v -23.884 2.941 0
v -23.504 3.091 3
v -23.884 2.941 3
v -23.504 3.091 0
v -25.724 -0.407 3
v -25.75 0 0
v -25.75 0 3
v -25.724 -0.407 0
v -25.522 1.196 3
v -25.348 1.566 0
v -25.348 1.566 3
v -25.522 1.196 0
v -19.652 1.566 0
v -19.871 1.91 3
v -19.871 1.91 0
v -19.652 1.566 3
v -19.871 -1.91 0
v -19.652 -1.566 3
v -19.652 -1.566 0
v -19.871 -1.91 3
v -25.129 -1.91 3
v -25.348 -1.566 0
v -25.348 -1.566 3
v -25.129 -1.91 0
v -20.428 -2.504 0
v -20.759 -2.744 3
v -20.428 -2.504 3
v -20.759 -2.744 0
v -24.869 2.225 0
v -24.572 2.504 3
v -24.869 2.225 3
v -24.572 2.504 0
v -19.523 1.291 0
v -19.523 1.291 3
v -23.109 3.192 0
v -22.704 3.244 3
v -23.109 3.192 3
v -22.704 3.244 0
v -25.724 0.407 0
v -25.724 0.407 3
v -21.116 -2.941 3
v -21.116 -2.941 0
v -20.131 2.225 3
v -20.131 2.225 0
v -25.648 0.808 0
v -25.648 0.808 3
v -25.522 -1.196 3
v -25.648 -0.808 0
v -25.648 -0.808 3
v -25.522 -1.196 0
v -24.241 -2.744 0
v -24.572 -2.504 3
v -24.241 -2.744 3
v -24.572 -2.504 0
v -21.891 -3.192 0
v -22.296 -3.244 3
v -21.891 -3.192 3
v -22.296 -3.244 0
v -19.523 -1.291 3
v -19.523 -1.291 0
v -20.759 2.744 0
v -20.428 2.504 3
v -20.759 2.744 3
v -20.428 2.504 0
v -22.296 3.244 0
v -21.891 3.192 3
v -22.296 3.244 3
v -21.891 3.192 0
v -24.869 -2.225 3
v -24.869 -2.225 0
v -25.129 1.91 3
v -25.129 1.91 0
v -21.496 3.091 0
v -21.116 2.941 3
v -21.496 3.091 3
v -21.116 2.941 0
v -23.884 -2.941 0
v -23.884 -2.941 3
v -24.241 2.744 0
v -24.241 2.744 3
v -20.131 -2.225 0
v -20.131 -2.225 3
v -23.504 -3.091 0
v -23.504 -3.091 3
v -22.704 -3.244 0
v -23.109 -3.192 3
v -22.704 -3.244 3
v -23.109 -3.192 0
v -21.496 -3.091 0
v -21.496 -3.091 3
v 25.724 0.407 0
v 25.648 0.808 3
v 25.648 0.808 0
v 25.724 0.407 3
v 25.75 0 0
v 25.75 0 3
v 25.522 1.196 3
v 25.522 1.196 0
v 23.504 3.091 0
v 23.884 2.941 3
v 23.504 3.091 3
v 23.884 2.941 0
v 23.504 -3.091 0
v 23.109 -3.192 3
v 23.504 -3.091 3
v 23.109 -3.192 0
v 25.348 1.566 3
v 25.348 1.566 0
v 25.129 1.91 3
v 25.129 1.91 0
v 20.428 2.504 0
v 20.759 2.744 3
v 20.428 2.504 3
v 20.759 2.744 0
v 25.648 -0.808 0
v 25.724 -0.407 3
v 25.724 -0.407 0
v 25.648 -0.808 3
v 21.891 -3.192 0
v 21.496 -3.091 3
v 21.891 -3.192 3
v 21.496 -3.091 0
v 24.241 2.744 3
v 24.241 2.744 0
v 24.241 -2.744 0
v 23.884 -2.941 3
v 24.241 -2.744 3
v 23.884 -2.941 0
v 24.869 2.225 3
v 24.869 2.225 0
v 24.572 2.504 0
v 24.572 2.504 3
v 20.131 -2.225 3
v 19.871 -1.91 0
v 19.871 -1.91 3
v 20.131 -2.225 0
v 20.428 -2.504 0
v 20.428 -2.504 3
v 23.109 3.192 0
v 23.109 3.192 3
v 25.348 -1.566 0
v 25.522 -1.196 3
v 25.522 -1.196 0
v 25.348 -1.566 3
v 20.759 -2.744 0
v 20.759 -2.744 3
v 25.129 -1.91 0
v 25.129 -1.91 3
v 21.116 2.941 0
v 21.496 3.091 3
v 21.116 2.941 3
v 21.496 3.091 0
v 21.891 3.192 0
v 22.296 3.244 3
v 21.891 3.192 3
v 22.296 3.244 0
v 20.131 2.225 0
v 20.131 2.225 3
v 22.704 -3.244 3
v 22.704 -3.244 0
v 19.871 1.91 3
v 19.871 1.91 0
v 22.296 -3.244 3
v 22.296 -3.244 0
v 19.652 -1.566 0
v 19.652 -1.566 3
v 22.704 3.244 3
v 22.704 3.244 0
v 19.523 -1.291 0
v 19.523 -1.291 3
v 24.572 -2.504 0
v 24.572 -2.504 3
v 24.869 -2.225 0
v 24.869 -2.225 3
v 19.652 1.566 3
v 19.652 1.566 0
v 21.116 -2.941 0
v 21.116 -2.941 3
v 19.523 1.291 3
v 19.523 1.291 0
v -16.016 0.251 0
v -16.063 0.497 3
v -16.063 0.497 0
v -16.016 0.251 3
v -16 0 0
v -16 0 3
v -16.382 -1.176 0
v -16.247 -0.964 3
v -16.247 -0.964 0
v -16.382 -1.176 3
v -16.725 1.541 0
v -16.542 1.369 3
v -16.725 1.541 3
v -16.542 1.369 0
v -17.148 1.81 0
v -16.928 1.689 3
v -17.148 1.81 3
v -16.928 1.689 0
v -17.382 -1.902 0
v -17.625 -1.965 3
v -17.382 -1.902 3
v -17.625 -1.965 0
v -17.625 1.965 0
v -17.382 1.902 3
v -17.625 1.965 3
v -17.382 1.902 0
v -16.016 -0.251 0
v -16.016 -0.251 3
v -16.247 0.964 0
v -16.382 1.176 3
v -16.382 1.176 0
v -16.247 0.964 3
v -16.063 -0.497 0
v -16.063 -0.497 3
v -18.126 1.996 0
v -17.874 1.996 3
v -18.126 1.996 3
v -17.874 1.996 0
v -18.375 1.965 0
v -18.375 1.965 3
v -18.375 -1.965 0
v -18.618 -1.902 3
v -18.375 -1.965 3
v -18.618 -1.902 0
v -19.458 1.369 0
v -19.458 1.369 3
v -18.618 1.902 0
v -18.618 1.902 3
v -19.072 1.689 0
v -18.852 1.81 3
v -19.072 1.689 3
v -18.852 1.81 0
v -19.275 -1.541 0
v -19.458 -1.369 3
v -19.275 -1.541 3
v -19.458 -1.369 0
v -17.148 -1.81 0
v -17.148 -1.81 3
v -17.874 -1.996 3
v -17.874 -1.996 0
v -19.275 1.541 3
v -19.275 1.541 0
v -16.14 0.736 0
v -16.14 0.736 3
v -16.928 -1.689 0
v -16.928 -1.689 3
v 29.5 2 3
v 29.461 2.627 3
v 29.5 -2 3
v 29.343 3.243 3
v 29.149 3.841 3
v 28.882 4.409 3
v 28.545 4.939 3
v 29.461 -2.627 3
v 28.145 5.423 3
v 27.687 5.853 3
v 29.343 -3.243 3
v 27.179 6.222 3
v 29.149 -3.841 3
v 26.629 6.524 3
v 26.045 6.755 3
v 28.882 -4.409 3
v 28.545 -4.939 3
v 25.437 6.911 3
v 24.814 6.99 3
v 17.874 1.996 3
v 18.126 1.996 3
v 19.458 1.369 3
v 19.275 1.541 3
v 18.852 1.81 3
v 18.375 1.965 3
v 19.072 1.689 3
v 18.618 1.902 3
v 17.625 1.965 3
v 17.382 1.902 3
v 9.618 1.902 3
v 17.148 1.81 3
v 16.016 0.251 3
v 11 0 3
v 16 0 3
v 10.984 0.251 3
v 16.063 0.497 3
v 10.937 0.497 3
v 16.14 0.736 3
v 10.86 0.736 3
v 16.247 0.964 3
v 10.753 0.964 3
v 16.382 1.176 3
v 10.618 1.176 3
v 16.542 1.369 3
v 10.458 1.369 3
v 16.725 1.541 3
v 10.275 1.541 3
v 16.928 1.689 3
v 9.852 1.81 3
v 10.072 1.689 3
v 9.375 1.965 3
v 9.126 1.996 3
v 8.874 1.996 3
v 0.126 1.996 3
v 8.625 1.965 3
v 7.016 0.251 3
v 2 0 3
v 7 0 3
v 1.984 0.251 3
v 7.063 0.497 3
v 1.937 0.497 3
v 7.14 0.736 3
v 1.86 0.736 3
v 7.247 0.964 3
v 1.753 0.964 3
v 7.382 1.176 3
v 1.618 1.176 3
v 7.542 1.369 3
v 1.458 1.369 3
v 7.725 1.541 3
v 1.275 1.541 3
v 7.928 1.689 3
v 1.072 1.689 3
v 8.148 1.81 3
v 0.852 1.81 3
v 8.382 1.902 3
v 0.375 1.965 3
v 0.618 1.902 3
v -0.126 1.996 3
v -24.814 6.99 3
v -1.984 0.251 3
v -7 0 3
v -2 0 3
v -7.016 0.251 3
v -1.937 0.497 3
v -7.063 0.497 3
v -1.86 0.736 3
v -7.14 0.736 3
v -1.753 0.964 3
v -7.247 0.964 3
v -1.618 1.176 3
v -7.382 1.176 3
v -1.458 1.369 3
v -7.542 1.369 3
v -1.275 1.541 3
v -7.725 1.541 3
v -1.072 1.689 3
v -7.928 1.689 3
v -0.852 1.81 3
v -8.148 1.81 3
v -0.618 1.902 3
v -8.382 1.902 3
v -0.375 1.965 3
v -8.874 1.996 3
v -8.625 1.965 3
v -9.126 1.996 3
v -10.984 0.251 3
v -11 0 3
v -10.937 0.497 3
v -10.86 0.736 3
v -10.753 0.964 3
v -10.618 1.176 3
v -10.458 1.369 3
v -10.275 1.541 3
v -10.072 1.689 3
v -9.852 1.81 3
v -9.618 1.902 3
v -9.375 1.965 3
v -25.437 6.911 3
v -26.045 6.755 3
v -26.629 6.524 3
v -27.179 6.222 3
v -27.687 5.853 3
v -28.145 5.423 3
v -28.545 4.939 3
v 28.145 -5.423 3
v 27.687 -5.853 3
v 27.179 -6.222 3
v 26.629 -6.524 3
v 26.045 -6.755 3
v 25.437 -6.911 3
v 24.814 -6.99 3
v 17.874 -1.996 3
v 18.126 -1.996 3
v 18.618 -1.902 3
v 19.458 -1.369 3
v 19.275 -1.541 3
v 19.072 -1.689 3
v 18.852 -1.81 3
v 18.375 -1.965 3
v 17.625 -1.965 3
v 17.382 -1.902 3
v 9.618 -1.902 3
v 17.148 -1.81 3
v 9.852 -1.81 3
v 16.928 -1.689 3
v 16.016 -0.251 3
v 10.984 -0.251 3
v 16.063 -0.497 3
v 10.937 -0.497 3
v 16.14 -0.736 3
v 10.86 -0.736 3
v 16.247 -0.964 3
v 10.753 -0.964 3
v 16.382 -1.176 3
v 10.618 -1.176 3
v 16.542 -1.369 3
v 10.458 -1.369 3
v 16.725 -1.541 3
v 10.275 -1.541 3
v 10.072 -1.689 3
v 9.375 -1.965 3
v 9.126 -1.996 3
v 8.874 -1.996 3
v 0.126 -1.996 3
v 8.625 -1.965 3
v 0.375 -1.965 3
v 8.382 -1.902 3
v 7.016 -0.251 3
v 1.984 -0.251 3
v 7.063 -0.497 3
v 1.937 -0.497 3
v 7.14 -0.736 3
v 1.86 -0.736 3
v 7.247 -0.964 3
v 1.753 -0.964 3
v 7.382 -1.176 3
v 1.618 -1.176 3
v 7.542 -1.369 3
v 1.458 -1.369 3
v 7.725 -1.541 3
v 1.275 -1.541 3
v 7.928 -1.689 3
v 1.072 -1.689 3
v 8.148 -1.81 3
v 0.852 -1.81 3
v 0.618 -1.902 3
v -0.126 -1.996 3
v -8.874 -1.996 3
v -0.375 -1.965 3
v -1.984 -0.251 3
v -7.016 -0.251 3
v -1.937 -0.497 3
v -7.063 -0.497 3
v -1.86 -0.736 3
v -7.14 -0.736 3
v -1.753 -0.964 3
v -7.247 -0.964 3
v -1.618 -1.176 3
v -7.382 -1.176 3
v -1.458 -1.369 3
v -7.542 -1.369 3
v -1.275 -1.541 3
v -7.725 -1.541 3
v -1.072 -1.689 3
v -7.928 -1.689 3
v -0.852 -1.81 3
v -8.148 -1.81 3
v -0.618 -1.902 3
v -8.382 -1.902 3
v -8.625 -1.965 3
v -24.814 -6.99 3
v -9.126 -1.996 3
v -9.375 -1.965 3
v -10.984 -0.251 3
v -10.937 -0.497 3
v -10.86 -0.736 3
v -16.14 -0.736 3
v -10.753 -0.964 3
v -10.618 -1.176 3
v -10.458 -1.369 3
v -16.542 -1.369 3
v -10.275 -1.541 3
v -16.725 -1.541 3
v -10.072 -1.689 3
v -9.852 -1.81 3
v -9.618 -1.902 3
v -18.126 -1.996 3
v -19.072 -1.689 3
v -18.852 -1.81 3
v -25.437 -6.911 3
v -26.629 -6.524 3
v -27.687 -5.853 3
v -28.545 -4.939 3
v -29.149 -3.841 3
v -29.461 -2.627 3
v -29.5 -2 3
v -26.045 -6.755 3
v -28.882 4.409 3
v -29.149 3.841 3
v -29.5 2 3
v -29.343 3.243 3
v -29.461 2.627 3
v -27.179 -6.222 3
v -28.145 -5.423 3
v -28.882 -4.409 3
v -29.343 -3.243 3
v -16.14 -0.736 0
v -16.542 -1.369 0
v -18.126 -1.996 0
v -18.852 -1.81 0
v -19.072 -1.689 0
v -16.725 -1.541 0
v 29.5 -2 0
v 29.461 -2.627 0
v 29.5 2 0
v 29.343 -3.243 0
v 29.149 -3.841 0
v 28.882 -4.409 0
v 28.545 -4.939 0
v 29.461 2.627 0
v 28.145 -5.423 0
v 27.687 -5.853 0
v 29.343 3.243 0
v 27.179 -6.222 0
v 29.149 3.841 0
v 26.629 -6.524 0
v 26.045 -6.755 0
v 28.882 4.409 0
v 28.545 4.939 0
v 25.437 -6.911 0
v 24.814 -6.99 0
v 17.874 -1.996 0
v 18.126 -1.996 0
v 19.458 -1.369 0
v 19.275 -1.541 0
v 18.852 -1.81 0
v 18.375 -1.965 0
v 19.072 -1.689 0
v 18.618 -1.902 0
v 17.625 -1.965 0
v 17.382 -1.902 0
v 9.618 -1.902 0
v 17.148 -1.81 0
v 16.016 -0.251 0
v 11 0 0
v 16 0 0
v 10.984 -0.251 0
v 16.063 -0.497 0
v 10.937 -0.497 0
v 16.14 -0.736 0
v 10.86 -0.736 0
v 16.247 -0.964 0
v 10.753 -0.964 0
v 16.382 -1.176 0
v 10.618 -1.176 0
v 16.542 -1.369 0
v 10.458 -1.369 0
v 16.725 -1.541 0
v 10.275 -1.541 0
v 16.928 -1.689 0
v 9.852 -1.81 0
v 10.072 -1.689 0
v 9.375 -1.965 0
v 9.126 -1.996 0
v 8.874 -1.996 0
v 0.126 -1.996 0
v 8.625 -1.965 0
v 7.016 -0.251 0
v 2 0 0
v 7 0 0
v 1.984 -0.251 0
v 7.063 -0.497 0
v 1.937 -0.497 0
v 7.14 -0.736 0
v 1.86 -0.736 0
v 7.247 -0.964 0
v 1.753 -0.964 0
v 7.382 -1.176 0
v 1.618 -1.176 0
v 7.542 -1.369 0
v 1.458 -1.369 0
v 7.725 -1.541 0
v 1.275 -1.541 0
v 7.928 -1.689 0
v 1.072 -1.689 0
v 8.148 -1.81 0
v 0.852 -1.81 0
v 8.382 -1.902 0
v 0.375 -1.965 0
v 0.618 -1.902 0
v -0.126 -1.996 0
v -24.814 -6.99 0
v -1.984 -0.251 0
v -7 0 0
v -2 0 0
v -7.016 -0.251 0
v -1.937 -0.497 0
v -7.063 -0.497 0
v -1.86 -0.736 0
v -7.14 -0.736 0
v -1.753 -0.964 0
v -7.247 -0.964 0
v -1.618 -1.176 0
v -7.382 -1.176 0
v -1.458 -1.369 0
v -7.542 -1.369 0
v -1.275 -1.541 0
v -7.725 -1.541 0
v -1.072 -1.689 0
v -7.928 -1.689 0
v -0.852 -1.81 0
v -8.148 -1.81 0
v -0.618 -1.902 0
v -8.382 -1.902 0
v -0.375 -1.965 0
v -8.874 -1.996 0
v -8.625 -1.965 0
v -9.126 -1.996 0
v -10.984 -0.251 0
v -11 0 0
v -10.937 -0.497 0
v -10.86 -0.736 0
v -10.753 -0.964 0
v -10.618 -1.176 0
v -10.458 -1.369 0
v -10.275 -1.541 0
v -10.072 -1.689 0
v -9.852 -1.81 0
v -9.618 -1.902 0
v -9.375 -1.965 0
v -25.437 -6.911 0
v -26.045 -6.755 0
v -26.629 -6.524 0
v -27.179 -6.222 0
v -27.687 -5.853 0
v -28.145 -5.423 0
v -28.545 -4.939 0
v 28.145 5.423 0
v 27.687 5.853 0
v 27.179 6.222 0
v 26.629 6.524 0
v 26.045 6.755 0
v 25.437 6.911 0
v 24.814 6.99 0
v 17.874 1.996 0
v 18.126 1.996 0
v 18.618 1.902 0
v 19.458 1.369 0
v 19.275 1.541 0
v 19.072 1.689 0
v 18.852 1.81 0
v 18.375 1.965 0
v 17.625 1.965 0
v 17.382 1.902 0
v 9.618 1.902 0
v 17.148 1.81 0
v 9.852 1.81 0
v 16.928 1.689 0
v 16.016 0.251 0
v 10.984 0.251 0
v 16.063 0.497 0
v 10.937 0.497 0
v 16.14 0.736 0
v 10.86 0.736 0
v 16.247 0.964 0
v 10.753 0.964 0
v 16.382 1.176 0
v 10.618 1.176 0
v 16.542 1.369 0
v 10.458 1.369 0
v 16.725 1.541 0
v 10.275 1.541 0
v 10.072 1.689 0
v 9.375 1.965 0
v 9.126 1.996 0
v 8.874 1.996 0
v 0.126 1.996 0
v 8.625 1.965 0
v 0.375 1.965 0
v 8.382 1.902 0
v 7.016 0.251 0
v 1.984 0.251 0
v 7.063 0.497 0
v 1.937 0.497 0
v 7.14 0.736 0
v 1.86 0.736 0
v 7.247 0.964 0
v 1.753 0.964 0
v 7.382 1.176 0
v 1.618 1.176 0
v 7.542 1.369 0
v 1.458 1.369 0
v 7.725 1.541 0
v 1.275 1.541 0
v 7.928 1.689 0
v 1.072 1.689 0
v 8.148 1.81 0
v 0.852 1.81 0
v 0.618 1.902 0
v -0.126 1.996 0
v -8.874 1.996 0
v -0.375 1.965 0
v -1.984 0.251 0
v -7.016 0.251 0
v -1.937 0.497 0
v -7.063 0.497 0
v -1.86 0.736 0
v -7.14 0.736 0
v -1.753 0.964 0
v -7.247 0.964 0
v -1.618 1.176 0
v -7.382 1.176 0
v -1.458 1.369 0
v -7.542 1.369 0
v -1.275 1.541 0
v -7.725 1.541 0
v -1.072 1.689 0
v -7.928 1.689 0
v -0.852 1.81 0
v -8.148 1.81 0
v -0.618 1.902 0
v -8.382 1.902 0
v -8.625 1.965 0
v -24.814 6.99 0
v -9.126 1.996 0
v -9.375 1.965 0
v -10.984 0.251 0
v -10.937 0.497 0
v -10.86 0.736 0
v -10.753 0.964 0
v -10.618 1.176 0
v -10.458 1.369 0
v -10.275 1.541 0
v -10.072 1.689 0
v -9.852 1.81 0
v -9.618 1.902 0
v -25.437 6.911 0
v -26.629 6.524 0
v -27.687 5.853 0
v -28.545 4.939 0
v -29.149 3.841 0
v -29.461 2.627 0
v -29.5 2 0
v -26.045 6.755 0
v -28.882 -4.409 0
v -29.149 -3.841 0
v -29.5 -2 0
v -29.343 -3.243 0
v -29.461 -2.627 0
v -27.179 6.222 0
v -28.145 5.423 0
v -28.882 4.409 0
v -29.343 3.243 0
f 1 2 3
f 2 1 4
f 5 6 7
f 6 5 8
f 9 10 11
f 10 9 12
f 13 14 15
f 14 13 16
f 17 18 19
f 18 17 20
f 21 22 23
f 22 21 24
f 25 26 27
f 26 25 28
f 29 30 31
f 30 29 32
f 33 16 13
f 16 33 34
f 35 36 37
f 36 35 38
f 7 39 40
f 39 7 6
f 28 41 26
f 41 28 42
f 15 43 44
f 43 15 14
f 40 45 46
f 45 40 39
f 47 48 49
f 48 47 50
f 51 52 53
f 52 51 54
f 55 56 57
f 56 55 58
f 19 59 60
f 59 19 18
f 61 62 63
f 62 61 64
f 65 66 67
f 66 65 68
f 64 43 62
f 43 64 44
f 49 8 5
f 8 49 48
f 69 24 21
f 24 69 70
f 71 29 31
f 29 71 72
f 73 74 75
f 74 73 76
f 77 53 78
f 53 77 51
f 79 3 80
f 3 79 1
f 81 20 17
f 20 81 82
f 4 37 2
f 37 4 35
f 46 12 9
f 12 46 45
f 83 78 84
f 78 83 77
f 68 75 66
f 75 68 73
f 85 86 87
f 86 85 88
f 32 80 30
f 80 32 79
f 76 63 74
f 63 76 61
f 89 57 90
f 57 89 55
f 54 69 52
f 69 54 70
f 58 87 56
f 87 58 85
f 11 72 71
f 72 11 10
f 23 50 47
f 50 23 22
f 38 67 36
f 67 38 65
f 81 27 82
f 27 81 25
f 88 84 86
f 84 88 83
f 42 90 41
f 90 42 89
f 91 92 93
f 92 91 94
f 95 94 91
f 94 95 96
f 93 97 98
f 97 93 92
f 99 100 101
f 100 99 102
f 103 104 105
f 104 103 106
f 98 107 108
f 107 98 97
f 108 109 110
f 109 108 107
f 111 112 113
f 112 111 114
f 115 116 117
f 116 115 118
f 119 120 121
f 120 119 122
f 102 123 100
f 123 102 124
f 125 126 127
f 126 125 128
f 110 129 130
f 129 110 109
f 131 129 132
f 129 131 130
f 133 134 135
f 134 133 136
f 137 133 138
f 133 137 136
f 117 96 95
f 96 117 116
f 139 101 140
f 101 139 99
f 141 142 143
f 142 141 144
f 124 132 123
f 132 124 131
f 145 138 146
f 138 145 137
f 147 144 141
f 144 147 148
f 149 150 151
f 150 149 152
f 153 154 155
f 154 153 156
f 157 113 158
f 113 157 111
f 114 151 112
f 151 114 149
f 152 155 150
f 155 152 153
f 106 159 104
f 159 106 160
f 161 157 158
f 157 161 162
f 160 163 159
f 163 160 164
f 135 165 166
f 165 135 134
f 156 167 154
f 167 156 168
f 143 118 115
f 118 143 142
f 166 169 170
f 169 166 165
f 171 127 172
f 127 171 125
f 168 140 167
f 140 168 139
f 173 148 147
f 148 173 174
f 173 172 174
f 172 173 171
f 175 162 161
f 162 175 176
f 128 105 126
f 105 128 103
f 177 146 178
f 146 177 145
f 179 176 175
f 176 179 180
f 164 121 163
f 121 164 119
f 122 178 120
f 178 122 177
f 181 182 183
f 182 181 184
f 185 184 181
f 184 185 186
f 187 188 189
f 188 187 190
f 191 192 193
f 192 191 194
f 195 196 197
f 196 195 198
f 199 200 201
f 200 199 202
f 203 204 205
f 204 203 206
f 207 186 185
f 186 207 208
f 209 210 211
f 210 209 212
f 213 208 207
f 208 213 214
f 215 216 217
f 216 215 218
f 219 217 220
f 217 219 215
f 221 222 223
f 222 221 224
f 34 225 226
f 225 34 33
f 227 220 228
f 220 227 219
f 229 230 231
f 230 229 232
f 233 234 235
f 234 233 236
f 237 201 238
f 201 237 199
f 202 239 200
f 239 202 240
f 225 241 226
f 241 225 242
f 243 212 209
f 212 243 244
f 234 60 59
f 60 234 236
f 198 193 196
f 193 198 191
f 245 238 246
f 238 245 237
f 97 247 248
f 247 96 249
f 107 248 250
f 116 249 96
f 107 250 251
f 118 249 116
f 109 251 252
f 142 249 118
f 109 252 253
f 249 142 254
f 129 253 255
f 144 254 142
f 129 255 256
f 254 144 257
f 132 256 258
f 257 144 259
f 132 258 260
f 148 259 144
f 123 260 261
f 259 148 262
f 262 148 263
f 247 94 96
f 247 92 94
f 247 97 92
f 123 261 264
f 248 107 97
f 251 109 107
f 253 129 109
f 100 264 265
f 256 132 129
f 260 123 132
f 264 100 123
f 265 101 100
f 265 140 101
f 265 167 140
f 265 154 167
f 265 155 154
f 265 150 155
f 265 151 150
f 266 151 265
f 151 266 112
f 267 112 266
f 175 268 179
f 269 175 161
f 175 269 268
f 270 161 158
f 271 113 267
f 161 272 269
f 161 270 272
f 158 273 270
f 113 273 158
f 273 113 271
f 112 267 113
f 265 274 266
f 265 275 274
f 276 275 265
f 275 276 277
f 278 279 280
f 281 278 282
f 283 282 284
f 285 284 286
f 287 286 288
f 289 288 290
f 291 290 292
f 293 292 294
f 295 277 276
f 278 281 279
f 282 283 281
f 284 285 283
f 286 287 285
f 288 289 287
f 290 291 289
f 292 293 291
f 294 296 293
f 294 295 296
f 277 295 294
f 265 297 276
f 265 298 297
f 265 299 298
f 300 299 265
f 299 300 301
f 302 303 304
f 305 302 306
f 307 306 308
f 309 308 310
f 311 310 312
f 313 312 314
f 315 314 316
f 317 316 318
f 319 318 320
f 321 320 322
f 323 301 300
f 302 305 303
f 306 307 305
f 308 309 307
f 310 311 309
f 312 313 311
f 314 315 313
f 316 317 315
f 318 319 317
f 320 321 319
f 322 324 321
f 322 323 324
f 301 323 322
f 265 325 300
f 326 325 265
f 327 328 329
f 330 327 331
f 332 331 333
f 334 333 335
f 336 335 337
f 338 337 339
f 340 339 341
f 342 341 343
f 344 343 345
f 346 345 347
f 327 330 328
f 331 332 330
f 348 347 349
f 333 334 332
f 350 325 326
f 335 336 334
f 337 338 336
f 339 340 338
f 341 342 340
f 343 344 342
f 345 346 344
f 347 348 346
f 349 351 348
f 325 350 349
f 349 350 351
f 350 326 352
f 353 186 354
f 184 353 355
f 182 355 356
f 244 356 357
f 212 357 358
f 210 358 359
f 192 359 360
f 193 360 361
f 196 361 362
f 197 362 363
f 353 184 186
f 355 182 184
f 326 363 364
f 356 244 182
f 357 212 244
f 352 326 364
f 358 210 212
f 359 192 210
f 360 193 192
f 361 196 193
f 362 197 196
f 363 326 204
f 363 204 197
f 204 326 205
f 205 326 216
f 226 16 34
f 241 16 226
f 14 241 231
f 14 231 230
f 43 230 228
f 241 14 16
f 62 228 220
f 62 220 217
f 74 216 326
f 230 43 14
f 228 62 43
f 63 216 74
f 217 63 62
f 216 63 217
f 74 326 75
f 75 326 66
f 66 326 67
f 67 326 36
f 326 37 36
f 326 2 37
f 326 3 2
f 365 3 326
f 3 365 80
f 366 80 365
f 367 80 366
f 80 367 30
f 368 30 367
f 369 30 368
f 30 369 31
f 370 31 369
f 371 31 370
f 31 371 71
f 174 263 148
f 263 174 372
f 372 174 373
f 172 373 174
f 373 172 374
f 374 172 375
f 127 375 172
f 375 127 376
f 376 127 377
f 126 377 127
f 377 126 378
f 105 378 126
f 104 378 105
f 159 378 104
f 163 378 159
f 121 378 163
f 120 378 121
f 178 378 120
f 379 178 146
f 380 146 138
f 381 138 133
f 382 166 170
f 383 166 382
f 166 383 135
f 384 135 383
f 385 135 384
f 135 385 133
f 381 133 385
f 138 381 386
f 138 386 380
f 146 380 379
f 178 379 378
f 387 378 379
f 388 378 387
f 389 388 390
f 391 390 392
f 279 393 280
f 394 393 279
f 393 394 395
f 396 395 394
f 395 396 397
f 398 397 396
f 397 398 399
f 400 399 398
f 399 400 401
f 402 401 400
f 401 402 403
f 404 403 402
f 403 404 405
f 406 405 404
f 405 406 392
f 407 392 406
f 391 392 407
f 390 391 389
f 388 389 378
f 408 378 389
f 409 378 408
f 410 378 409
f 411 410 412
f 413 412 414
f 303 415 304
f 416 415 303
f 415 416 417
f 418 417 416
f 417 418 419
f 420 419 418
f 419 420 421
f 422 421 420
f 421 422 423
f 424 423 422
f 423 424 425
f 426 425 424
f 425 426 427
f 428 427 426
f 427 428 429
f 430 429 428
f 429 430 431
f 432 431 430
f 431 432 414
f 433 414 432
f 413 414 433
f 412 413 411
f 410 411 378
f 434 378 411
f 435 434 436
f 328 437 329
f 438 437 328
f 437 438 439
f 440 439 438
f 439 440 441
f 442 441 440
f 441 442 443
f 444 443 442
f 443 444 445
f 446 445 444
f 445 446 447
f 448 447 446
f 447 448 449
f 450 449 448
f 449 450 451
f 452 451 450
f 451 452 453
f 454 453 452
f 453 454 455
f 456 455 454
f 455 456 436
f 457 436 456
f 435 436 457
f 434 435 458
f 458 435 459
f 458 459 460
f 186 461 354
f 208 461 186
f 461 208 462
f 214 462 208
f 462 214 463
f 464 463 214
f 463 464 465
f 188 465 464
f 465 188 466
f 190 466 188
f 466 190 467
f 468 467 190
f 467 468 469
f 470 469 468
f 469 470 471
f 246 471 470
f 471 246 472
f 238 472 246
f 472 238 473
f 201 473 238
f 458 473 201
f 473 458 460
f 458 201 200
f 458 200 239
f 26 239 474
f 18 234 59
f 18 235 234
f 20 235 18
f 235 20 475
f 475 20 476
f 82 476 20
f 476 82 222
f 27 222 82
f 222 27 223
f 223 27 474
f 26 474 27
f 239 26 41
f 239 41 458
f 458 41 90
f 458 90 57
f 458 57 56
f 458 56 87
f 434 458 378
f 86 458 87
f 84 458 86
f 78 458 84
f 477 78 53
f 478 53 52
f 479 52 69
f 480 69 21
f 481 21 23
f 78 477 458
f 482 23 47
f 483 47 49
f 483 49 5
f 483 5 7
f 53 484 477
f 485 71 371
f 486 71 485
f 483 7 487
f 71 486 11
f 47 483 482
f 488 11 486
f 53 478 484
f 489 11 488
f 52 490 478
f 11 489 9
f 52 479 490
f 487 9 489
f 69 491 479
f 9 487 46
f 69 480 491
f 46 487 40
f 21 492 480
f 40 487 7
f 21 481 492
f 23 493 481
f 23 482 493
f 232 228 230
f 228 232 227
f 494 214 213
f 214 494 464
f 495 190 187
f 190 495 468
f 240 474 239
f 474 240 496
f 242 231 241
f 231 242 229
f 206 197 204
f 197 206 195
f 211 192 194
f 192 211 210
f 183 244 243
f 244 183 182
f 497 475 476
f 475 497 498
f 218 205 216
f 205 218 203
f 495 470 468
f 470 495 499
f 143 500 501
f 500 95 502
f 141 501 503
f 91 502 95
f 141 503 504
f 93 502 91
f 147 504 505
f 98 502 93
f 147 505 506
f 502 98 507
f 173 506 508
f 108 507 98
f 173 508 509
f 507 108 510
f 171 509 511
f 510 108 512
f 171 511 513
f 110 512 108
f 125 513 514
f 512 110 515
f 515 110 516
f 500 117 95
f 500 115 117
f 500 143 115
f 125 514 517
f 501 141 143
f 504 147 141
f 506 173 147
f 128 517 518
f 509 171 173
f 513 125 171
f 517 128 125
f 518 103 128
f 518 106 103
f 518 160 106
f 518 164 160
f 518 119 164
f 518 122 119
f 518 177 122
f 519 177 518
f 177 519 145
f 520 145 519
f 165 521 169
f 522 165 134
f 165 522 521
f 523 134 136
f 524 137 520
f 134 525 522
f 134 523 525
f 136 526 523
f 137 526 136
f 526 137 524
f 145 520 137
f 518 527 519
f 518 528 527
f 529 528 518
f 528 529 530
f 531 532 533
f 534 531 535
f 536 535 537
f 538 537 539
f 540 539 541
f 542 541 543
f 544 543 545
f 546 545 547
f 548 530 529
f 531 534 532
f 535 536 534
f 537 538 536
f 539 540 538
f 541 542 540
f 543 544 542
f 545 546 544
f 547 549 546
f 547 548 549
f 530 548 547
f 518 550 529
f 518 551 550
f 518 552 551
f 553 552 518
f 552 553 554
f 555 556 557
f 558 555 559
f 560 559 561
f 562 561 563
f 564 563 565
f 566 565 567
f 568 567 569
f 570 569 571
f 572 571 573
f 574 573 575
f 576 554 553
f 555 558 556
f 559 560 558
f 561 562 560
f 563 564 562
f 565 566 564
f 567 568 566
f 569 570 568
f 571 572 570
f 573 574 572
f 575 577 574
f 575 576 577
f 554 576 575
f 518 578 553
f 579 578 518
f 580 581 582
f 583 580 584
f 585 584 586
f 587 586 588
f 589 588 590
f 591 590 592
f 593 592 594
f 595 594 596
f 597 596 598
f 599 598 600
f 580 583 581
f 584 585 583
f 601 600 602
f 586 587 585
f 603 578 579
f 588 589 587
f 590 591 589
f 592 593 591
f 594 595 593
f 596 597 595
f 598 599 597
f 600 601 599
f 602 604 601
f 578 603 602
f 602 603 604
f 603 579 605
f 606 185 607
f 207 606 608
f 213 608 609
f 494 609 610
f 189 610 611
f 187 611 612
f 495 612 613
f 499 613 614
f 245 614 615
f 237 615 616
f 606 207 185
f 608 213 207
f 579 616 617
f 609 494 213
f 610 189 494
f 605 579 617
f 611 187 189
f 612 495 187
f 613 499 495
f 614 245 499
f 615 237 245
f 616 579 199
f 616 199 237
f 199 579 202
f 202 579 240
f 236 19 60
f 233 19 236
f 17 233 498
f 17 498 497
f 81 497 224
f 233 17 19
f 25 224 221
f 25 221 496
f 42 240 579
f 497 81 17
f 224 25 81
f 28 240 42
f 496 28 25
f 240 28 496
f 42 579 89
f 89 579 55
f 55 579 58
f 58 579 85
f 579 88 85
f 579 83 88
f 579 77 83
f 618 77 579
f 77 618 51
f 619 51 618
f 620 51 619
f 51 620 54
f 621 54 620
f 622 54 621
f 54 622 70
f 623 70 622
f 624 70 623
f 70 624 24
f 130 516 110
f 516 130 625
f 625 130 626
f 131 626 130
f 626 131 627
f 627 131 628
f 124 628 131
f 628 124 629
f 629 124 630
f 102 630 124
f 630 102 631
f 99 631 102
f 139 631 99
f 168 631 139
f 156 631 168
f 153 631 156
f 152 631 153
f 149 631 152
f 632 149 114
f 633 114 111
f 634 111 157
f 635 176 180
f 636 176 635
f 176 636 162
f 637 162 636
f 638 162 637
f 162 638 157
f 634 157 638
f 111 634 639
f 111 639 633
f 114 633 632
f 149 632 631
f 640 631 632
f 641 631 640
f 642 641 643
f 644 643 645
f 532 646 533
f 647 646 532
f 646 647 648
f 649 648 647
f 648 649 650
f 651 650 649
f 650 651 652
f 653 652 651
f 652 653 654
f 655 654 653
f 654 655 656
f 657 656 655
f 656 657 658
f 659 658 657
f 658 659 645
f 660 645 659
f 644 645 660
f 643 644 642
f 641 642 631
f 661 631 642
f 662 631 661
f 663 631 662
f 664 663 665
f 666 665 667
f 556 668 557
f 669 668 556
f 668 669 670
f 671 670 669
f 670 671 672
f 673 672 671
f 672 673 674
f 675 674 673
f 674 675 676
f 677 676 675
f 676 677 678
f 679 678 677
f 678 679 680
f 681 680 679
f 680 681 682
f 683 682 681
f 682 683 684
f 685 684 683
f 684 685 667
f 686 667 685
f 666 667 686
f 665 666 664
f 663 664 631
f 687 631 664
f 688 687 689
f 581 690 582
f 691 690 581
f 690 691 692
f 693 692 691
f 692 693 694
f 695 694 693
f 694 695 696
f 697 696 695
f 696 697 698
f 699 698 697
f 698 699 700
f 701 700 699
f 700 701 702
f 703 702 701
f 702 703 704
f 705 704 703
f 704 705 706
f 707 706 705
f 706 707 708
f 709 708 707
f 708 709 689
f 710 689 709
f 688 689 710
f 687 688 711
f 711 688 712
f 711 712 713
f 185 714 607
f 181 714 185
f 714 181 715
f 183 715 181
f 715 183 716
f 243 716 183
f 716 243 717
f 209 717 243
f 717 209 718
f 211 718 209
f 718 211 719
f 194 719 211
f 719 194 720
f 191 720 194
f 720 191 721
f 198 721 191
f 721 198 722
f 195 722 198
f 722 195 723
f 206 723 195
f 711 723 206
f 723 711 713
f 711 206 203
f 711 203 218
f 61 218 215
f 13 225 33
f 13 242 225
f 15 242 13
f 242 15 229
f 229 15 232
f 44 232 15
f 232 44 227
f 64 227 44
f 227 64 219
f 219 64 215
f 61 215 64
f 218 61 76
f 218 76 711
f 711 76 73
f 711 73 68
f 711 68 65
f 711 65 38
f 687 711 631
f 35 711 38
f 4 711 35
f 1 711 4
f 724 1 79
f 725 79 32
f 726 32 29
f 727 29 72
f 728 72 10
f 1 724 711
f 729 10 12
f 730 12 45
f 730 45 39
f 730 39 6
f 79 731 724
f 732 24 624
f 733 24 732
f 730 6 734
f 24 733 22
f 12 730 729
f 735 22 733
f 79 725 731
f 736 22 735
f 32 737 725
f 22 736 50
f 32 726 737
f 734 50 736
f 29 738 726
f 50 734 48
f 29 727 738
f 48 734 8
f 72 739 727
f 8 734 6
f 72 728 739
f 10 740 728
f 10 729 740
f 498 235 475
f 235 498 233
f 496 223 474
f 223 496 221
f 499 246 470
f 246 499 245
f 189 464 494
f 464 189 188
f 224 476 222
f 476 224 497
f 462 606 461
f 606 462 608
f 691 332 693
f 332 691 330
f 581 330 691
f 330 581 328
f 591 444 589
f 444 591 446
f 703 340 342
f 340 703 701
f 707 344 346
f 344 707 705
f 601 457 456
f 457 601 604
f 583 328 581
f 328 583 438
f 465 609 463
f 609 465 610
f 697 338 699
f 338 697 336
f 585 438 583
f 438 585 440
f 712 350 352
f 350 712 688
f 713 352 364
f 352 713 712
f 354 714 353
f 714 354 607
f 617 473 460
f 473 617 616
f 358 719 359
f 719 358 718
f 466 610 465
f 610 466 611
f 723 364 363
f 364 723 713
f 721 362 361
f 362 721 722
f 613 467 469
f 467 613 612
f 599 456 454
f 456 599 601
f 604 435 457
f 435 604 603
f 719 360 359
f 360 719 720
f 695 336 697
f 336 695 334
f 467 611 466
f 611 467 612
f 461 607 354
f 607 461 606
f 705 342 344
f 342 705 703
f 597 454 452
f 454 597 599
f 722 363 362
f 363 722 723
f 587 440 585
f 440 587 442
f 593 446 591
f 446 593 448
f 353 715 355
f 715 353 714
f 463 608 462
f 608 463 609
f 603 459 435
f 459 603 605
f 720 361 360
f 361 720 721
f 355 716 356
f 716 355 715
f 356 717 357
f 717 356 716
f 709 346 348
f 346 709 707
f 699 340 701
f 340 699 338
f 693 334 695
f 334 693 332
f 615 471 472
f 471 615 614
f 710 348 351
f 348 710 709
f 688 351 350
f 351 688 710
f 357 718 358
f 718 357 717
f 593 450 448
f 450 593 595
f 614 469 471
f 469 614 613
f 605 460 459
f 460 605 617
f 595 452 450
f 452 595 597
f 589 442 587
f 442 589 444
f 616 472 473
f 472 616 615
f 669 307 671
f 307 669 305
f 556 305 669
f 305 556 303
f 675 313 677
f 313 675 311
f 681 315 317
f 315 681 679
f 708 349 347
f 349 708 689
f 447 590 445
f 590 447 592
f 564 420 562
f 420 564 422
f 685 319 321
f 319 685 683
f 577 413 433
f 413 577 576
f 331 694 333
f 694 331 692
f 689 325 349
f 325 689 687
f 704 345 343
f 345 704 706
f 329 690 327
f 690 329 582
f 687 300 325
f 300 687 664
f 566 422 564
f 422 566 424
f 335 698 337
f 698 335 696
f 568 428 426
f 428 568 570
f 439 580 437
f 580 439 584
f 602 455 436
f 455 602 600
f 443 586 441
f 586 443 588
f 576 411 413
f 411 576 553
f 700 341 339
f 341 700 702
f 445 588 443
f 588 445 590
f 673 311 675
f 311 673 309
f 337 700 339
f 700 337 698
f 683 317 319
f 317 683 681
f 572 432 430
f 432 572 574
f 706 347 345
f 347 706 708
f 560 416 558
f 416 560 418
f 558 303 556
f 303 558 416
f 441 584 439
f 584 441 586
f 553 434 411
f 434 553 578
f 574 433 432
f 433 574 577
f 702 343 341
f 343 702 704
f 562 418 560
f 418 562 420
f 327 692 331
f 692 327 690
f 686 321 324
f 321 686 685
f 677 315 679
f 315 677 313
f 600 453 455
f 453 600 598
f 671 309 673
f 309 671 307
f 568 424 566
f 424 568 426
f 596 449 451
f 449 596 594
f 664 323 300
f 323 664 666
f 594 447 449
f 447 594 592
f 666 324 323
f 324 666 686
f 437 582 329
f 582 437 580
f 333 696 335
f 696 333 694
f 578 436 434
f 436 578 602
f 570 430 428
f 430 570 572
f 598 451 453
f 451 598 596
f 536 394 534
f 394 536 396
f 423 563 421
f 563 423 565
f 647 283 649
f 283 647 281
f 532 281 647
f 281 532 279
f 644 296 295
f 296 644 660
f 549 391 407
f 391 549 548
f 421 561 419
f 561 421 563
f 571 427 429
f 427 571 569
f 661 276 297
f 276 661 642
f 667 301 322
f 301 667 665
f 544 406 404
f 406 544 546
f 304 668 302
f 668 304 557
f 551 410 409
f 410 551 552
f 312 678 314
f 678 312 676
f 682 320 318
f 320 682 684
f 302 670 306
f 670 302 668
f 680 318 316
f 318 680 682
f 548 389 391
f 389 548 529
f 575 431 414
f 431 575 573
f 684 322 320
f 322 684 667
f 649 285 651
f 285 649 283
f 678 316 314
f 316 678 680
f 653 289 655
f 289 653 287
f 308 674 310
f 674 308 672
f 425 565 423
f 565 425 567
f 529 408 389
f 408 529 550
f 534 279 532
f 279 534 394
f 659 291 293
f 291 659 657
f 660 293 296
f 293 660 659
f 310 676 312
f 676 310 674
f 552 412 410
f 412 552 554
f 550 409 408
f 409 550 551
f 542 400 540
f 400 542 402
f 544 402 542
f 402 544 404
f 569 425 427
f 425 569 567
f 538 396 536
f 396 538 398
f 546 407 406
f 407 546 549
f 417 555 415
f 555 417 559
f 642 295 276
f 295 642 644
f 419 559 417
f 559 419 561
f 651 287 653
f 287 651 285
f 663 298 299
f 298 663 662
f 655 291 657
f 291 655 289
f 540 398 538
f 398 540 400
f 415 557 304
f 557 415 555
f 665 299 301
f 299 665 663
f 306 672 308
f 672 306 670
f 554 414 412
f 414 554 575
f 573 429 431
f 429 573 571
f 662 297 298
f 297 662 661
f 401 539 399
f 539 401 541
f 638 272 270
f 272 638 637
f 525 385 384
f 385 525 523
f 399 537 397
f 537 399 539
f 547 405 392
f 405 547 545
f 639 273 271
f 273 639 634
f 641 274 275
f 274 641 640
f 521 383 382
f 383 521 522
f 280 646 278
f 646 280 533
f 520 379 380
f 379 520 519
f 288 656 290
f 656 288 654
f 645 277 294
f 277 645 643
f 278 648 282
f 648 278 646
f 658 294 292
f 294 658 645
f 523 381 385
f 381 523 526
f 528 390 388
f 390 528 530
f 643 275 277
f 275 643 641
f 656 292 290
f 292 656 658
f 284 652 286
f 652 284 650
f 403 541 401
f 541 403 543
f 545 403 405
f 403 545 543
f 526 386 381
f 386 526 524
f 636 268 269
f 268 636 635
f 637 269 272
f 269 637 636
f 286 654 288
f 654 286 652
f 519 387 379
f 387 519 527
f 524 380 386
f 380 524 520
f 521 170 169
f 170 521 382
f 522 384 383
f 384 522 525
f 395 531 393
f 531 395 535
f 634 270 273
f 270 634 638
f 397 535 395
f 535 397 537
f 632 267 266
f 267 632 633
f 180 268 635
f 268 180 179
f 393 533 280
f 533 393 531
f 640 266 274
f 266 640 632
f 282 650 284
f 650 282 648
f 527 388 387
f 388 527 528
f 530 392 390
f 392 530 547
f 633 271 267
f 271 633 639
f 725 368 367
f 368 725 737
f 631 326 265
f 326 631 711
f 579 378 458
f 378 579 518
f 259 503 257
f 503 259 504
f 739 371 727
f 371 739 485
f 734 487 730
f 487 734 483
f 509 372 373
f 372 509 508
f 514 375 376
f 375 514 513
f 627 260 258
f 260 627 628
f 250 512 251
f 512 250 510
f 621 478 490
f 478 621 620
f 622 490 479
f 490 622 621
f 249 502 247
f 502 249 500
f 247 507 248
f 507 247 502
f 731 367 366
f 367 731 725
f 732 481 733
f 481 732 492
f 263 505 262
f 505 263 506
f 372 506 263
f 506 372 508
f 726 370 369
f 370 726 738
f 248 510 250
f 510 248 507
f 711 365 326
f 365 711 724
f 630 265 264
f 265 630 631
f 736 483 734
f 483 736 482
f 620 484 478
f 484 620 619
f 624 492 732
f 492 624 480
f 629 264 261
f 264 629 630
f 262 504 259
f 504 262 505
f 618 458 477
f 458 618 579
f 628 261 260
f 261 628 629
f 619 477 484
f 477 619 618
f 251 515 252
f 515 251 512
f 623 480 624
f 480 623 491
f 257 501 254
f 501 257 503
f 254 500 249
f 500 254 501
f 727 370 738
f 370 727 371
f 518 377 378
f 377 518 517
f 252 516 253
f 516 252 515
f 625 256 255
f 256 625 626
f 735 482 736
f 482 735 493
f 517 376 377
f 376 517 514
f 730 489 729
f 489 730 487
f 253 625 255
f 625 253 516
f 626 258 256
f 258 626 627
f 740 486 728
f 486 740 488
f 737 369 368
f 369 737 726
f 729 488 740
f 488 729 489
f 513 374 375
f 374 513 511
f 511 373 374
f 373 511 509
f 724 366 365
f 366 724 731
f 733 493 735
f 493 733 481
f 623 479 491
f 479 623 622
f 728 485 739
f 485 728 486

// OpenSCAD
$fn = 50;

difference() {
	union() {
		hull() {
			translate(v = [-24.5, 2.0, 0]) {
				cylinder(h = 3, r = 5);
			}
			translate(v = [24.5, 2.0, 0]) {
				cylinder(h = 3, r = 5);
			}
			translate(v = [-24.5, -2.0, 0]) {
				cylinder(h = 3, r = 5);
			}
			translate(v = [24.5, -2.0, 0]) {
				cylinder(h = 3, r = 5);
			}
		}
	}
	union() {
		translate(v = [-22.5, 0.0, -100.0]) {
			cylinder(h = 200, r = 3.25);
		}
		translate(v = [22.5, 0.0, -100.0]) {
			cylinder(h = 200, r = 3.25);
		}
		translate(v = [-22.5, 0.0, -100.0]) {
			cylinder(h = 200, r = 1.8);
		}
		translate(v = [22.5, 0.0, -100.0]) {
			cylinder(h = 200, r = 1.8);
		}
		translate(v = [-18.0, 0, 0.0]) {
			cylinder(h = 3, r = 2.0);
		}
		translate(v = [-9.0, 0, 0.0]) {
			cylinder(h = 3, r = 2.0);
		}
		cylinder(h = 3, r = 2.0);
		translate(v = [9.0, 0, 0.0]) {
			cylinder(h = 3, r = 2.0);
		}
		translate(v = [18.0, 0, 0.0]) {
			cylinder(h = 3, r = 2.0);
		}
	}
}
